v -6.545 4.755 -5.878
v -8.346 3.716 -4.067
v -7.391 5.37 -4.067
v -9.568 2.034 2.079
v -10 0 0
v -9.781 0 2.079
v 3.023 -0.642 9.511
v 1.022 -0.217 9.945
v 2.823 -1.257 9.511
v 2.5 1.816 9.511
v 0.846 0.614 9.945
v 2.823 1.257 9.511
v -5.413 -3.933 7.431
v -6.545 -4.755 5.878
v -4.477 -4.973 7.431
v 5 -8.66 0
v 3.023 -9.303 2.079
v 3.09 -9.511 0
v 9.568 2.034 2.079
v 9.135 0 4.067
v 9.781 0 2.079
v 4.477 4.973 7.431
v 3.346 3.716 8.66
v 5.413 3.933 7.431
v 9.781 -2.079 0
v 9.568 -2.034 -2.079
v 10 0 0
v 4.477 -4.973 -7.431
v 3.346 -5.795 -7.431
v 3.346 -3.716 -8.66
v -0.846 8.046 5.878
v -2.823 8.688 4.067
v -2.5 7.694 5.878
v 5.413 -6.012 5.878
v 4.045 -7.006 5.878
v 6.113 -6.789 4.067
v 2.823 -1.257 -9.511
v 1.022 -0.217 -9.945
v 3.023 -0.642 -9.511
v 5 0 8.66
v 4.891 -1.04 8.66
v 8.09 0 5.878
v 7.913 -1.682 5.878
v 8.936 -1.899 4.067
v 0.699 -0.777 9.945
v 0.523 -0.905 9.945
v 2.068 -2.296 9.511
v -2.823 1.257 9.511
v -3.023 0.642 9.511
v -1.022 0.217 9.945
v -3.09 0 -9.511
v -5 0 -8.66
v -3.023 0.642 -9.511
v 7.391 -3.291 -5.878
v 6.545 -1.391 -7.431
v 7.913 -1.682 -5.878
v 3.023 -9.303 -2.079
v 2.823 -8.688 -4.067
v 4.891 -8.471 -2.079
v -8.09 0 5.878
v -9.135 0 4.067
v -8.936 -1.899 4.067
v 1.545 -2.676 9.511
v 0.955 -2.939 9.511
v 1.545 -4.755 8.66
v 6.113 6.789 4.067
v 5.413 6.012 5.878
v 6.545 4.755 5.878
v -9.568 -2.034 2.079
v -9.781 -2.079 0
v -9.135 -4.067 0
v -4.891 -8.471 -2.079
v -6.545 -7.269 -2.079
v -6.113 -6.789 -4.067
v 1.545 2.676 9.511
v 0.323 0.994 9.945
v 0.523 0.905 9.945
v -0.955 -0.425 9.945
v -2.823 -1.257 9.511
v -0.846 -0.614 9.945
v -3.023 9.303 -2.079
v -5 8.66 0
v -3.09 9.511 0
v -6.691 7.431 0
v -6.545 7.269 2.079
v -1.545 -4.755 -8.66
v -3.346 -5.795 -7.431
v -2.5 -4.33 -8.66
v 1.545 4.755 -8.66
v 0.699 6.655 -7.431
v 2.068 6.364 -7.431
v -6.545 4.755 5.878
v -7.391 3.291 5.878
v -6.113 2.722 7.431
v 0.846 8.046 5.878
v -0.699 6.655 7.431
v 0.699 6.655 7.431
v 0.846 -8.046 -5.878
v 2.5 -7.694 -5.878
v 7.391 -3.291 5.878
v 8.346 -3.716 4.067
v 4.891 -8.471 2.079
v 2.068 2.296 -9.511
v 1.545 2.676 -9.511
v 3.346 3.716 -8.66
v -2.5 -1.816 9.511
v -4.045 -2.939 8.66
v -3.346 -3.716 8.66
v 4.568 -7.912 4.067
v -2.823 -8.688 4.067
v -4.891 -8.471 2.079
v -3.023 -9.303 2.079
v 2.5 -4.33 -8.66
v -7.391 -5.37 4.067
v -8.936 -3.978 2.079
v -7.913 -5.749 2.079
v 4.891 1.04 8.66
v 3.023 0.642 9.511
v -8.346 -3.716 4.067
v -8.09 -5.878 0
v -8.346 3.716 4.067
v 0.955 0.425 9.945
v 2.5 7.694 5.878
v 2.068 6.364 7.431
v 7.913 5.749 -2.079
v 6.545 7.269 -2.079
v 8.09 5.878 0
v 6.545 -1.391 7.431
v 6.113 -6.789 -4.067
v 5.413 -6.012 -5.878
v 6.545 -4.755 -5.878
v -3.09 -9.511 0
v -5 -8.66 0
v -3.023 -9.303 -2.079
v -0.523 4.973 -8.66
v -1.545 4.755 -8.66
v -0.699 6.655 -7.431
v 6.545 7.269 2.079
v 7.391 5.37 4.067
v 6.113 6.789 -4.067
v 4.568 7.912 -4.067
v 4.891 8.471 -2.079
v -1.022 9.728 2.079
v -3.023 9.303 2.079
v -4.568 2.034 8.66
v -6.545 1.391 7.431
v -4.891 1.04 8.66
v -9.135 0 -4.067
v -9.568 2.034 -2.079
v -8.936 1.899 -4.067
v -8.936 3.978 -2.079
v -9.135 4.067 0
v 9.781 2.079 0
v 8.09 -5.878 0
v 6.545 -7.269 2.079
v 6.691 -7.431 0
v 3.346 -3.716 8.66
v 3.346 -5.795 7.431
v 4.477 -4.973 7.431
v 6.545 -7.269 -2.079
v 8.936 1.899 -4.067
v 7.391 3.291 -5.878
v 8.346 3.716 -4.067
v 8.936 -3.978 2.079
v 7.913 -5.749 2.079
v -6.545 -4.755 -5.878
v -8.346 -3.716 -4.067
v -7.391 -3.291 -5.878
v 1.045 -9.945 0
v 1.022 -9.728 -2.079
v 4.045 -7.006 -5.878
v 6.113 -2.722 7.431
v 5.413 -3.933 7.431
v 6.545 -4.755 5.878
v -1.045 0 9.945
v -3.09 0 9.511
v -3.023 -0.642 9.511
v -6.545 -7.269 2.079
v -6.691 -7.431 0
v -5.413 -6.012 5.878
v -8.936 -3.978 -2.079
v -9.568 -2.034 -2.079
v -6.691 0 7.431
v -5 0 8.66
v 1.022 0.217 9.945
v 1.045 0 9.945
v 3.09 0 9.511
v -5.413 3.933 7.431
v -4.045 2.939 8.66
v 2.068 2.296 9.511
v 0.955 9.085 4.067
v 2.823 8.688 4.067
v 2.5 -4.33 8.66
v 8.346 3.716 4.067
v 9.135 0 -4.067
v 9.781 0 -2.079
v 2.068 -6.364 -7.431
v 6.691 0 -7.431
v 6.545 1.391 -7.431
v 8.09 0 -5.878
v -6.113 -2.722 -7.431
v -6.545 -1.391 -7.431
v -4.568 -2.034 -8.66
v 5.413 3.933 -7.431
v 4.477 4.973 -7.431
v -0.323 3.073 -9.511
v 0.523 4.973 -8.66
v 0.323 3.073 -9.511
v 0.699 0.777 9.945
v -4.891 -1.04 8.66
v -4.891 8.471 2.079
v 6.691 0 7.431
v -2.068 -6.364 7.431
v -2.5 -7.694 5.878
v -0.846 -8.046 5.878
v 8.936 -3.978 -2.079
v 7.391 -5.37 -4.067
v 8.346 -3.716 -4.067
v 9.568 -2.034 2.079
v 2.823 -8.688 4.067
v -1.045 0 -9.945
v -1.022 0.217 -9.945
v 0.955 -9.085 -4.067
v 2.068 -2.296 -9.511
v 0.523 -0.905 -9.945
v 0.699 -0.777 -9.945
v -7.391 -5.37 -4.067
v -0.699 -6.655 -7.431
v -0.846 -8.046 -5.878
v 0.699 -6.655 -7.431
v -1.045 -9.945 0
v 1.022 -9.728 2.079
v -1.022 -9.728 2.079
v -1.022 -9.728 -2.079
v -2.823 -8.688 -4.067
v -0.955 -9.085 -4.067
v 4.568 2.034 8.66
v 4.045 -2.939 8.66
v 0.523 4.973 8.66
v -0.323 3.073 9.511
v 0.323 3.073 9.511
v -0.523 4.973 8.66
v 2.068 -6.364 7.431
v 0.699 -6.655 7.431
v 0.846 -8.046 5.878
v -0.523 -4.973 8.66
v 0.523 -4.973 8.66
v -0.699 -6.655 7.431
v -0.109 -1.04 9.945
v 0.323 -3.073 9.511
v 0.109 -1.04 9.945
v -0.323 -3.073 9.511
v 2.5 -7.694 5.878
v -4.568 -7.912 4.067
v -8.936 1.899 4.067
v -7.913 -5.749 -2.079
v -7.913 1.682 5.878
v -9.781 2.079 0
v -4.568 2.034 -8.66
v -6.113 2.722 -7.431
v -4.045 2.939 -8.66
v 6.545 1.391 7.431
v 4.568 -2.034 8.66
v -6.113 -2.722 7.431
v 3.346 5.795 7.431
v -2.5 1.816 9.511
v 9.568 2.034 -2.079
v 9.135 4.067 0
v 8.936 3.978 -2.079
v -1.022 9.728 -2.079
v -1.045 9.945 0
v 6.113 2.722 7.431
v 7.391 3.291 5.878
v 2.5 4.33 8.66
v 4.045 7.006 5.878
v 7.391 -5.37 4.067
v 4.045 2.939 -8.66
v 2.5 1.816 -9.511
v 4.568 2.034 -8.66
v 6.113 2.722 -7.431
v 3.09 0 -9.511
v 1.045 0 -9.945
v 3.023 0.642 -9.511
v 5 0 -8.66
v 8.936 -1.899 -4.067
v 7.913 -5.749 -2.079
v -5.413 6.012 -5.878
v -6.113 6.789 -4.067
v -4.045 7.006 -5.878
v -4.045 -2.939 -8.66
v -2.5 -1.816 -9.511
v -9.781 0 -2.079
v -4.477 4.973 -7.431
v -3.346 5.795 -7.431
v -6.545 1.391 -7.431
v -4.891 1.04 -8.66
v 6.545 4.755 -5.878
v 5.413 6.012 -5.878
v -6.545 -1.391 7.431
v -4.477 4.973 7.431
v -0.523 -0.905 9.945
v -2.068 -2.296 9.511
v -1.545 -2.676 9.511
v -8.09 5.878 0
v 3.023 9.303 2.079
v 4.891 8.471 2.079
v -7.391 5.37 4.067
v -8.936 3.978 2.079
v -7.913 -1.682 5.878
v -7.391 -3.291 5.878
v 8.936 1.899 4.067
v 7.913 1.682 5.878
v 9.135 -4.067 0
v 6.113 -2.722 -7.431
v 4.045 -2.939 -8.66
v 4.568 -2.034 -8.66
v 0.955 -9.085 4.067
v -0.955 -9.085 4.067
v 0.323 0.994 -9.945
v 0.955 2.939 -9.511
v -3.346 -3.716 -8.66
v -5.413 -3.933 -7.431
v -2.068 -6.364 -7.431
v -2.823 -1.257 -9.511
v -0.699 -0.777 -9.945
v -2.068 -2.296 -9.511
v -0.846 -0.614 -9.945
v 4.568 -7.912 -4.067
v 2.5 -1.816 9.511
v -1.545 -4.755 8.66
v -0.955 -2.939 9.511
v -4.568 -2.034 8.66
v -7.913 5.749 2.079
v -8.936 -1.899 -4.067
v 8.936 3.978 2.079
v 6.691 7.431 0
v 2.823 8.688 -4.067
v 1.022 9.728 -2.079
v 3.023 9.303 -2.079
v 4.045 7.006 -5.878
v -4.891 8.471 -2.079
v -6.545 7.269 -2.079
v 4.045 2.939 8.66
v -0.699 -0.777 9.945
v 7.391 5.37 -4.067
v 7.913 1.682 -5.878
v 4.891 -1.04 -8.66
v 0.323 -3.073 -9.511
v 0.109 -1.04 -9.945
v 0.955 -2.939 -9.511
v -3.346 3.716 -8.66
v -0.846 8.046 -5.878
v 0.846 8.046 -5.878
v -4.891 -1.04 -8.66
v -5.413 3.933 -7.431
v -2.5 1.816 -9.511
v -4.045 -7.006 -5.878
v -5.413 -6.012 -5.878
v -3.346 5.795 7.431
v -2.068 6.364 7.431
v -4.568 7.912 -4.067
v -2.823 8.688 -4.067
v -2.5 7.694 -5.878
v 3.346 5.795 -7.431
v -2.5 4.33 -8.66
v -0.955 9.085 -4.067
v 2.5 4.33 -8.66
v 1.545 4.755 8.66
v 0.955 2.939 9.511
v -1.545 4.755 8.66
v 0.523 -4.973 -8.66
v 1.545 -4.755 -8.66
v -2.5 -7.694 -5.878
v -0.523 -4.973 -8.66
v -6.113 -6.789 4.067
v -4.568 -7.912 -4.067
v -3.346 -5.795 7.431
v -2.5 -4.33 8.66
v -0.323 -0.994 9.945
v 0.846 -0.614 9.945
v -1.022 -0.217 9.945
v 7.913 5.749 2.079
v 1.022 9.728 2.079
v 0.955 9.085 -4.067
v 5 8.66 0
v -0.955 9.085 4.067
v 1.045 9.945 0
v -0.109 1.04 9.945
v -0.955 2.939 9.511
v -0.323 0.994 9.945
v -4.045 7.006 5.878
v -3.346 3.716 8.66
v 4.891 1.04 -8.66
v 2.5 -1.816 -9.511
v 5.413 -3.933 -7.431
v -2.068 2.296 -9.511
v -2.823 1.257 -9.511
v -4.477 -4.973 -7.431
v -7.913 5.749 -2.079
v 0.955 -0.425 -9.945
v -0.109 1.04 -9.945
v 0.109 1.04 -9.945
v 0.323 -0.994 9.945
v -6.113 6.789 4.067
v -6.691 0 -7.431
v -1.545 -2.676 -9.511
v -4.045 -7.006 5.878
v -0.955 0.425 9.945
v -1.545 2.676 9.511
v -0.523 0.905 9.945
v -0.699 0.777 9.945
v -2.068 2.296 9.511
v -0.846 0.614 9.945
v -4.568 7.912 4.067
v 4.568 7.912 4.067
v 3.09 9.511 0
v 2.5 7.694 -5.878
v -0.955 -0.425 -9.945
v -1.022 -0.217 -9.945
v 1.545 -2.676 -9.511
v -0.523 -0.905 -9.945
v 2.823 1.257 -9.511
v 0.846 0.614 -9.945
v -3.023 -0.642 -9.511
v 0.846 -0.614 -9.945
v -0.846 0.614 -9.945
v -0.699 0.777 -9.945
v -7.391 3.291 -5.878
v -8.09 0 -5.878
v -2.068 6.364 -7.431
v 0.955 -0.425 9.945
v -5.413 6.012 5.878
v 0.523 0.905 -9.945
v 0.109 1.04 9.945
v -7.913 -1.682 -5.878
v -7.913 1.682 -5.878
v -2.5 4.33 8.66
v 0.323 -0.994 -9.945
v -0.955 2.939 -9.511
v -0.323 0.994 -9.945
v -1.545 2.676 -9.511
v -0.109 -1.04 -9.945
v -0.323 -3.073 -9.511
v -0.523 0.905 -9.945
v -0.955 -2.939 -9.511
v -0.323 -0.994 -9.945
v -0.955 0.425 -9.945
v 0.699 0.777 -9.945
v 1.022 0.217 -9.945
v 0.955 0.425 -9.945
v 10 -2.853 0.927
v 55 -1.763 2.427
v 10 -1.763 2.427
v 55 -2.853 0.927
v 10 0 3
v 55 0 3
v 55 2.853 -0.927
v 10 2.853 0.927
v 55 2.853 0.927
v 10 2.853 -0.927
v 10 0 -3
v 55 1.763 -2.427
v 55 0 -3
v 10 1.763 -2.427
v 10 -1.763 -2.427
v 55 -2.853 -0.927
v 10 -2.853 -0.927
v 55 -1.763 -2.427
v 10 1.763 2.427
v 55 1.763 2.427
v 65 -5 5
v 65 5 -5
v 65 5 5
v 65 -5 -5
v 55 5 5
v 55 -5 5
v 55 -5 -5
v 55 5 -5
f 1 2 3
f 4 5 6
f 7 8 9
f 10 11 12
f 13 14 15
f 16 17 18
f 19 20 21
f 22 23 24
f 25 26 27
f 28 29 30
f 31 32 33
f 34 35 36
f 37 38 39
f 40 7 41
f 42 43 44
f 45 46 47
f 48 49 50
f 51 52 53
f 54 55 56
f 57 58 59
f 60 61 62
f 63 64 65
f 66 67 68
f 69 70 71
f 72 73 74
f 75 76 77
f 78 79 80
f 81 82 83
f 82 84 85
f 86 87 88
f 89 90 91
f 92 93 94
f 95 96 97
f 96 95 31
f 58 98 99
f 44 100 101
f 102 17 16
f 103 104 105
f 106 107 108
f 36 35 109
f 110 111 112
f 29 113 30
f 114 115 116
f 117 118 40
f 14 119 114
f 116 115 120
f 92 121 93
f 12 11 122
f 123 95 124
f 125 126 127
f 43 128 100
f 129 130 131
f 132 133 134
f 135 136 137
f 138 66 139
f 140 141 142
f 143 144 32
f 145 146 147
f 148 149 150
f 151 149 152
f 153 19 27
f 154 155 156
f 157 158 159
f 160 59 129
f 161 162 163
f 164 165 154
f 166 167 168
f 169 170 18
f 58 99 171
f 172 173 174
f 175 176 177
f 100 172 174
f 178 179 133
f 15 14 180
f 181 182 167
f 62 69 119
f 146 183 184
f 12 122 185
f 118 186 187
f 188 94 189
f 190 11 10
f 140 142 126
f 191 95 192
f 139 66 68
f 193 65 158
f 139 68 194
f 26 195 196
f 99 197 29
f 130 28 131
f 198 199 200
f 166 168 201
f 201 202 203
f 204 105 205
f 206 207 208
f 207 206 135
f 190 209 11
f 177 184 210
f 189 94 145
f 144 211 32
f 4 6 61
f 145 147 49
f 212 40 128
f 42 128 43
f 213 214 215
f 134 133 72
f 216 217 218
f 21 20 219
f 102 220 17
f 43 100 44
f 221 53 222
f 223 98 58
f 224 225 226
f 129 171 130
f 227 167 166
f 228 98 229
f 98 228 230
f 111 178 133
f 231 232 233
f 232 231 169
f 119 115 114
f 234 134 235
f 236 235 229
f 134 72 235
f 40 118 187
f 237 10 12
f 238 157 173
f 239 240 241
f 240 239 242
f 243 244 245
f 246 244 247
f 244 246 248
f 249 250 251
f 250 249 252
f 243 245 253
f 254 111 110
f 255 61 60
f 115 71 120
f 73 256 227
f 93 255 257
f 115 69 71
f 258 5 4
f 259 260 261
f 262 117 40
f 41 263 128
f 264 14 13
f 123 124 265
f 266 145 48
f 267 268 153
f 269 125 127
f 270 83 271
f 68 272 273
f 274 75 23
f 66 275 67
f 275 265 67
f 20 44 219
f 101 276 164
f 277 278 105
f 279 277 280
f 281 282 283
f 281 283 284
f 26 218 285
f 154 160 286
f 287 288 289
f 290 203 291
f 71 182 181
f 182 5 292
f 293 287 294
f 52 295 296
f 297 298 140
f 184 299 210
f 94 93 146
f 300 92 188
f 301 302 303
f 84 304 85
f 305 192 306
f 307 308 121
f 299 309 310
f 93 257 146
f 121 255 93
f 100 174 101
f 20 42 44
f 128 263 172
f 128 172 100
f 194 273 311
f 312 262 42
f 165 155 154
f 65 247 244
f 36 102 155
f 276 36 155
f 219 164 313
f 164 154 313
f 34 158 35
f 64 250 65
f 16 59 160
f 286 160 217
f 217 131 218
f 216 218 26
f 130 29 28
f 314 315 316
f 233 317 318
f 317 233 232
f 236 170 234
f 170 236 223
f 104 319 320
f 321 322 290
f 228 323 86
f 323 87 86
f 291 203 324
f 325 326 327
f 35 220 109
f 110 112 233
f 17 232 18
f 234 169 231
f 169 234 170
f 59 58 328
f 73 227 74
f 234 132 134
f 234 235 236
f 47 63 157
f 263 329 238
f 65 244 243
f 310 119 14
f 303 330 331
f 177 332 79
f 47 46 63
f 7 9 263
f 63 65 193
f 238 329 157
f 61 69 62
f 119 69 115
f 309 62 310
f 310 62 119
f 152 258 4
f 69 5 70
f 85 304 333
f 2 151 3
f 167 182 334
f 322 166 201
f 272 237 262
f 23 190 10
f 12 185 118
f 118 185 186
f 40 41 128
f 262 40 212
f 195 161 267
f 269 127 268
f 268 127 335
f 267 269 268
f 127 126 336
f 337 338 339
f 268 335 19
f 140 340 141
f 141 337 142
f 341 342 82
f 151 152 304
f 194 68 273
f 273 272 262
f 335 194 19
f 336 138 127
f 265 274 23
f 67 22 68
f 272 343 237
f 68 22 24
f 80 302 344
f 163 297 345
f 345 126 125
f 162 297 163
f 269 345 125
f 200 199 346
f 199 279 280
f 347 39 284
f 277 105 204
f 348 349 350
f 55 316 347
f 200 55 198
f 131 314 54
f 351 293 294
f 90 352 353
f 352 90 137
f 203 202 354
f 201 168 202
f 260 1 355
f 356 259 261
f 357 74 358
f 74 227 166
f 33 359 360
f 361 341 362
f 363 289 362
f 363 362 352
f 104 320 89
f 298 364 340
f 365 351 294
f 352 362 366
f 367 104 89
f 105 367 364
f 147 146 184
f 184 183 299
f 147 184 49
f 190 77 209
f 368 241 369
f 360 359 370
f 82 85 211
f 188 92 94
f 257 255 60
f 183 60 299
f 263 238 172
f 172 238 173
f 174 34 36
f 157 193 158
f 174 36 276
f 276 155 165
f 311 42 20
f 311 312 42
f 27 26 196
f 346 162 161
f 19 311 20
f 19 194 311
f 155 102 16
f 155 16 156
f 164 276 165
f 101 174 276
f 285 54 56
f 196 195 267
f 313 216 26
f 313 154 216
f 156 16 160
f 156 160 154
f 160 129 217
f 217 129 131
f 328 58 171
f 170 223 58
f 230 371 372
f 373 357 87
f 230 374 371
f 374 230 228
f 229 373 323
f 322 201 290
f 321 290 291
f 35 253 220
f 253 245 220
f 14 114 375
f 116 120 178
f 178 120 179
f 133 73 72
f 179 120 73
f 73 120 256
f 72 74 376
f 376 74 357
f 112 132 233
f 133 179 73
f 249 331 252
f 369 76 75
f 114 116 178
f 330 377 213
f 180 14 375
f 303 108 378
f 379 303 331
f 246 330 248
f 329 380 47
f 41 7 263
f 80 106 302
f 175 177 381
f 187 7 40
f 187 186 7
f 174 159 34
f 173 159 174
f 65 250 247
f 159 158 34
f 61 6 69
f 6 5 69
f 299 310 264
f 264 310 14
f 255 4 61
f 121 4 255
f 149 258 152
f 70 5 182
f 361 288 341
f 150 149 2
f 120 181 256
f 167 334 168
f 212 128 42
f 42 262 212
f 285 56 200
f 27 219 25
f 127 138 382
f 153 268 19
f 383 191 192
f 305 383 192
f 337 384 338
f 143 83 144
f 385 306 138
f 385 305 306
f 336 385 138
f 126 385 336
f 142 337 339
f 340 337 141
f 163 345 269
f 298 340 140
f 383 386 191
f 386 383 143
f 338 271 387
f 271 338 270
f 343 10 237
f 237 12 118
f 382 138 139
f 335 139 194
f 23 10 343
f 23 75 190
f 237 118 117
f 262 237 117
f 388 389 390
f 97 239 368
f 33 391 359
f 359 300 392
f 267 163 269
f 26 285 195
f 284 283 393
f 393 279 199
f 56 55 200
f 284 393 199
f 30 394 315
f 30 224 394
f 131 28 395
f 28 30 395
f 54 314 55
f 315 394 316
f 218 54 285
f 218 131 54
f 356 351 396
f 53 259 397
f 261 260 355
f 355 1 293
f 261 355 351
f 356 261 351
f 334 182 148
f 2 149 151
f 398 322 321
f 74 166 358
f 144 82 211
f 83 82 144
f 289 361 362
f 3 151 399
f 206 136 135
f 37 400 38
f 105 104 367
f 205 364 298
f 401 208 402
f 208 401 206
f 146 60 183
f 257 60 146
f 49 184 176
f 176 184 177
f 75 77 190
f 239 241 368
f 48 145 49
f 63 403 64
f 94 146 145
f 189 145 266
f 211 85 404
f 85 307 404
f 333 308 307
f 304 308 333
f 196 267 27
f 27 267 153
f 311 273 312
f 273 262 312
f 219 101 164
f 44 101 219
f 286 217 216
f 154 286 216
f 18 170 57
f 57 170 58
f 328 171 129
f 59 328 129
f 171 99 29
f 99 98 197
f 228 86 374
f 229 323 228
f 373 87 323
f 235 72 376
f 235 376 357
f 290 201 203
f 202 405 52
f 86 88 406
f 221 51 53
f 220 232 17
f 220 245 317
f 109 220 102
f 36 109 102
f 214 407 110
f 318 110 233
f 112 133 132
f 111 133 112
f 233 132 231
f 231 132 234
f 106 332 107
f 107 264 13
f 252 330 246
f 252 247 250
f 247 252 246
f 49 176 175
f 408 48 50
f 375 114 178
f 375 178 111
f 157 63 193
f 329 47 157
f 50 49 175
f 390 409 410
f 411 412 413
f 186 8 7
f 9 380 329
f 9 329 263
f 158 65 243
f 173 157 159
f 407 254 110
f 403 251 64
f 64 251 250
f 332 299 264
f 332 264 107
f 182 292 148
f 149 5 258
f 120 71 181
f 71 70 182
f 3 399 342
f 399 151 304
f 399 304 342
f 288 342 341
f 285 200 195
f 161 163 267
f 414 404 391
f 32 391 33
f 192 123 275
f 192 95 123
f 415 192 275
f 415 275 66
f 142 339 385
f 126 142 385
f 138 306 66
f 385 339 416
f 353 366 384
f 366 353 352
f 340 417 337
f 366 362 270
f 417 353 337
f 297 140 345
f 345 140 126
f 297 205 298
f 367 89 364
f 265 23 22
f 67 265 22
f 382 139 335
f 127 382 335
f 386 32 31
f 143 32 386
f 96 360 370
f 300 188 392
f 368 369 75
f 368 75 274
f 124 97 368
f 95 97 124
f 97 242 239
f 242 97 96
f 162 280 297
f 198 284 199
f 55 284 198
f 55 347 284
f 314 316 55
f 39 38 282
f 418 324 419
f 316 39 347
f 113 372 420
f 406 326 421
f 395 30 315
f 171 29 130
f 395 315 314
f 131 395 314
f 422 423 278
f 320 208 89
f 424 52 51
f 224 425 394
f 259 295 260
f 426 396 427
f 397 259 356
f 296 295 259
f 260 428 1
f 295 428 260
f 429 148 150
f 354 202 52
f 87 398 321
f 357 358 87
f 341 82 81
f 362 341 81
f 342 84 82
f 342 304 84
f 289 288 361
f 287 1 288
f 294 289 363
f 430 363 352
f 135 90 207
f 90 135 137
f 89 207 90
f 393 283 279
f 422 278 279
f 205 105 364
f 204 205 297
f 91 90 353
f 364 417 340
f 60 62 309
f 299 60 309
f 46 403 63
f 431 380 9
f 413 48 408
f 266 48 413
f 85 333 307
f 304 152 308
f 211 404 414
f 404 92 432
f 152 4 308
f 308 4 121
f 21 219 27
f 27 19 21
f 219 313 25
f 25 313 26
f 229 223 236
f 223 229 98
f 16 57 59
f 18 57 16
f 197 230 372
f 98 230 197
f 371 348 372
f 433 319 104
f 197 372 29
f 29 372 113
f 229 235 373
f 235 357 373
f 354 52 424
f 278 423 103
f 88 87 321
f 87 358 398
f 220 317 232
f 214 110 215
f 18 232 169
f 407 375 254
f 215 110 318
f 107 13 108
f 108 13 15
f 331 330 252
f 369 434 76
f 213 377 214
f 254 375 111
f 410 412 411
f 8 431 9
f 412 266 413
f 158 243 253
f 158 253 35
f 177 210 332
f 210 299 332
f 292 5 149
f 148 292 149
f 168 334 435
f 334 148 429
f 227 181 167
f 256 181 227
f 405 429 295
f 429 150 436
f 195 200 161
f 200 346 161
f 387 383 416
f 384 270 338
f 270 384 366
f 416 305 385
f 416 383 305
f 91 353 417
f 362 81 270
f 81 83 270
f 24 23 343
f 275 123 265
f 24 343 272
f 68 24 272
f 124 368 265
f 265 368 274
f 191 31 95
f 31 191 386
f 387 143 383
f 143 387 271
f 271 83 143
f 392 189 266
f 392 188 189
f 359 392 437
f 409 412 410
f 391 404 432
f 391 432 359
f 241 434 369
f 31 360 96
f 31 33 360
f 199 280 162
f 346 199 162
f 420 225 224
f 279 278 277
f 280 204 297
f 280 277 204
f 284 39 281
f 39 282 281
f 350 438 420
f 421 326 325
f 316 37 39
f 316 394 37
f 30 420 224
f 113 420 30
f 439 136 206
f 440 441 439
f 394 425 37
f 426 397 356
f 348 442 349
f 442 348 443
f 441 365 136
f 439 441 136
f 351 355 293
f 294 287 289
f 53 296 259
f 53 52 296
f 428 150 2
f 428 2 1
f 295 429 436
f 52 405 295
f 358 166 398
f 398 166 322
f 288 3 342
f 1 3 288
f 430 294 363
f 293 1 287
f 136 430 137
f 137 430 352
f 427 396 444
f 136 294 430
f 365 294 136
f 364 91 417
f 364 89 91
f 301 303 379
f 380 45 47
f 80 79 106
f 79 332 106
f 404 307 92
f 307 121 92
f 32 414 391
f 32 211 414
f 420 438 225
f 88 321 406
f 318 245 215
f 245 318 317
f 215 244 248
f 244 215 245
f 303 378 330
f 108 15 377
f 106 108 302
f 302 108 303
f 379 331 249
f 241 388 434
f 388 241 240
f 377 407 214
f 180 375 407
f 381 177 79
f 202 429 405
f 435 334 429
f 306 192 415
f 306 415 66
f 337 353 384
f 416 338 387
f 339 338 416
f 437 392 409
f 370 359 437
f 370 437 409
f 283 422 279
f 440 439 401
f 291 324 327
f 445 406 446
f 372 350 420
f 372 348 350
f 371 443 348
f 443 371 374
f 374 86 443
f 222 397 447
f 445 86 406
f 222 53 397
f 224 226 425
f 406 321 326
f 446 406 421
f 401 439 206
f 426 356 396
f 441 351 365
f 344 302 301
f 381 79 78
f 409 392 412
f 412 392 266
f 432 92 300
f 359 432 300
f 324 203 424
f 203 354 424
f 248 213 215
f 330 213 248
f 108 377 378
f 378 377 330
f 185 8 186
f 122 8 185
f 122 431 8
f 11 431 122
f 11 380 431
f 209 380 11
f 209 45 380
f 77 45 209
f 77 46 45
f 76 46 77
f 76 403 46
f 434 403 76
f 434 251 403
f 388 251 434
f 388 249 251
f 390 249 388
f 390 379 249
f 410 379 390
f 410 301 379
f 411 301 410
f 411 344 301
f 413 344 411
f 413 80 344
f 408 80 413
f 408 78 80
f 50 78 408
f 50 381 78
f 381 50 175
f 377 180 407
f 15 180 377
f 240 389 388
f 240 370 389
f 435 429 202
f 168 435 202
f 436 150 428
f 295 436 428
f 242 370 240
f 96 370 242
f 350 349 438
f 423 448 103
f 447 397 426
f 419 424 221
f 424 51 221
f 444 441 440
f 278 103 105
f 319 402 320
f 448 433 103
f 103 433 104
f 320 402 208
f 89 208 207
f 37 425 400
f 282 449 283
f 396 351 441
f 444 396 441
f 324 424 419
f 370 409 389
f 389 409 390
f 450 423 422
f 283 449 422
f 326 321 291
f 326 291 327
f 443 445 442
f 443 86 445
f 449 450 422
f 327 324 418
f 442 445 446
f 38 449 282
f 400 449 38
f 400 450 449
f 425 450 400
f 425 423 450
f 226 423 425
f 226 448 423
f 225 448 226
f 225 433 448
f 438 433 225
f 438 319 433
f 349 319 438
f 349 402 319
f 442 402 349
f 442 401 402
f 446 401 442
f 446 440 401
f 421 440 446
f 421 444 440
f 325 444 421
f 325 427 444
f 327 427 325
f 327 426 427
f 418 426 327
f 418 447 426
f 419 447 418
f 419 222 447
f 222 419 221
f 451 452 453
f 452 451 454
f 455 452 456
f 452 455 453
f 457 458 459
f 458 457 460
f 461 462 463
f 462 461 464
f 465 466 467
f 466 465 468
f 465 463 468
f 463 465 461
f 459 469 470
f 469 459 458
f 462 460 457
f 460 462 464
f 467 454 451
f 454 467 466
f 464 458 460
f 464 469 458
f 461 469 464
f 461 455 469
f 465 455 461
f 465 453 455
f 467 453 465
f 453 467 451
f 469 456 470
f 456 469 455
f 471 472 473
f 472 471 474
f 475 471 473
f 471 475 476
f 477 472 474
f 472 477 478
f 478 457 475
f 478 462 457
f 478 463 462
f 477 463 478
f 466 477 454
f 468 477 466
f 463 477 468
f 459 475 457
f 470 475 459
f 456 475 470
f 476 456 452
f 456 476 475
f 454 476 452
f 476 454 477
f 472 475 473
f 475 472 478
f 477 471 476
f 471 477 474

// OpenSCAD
//Sender
sphere(10);

//Wire
translate([10,0,0])
rotate([0,90,0])
cylinder(h = 50, r = 3);

//Receiver
translate([60,0,0])
cube(10, center = true);
